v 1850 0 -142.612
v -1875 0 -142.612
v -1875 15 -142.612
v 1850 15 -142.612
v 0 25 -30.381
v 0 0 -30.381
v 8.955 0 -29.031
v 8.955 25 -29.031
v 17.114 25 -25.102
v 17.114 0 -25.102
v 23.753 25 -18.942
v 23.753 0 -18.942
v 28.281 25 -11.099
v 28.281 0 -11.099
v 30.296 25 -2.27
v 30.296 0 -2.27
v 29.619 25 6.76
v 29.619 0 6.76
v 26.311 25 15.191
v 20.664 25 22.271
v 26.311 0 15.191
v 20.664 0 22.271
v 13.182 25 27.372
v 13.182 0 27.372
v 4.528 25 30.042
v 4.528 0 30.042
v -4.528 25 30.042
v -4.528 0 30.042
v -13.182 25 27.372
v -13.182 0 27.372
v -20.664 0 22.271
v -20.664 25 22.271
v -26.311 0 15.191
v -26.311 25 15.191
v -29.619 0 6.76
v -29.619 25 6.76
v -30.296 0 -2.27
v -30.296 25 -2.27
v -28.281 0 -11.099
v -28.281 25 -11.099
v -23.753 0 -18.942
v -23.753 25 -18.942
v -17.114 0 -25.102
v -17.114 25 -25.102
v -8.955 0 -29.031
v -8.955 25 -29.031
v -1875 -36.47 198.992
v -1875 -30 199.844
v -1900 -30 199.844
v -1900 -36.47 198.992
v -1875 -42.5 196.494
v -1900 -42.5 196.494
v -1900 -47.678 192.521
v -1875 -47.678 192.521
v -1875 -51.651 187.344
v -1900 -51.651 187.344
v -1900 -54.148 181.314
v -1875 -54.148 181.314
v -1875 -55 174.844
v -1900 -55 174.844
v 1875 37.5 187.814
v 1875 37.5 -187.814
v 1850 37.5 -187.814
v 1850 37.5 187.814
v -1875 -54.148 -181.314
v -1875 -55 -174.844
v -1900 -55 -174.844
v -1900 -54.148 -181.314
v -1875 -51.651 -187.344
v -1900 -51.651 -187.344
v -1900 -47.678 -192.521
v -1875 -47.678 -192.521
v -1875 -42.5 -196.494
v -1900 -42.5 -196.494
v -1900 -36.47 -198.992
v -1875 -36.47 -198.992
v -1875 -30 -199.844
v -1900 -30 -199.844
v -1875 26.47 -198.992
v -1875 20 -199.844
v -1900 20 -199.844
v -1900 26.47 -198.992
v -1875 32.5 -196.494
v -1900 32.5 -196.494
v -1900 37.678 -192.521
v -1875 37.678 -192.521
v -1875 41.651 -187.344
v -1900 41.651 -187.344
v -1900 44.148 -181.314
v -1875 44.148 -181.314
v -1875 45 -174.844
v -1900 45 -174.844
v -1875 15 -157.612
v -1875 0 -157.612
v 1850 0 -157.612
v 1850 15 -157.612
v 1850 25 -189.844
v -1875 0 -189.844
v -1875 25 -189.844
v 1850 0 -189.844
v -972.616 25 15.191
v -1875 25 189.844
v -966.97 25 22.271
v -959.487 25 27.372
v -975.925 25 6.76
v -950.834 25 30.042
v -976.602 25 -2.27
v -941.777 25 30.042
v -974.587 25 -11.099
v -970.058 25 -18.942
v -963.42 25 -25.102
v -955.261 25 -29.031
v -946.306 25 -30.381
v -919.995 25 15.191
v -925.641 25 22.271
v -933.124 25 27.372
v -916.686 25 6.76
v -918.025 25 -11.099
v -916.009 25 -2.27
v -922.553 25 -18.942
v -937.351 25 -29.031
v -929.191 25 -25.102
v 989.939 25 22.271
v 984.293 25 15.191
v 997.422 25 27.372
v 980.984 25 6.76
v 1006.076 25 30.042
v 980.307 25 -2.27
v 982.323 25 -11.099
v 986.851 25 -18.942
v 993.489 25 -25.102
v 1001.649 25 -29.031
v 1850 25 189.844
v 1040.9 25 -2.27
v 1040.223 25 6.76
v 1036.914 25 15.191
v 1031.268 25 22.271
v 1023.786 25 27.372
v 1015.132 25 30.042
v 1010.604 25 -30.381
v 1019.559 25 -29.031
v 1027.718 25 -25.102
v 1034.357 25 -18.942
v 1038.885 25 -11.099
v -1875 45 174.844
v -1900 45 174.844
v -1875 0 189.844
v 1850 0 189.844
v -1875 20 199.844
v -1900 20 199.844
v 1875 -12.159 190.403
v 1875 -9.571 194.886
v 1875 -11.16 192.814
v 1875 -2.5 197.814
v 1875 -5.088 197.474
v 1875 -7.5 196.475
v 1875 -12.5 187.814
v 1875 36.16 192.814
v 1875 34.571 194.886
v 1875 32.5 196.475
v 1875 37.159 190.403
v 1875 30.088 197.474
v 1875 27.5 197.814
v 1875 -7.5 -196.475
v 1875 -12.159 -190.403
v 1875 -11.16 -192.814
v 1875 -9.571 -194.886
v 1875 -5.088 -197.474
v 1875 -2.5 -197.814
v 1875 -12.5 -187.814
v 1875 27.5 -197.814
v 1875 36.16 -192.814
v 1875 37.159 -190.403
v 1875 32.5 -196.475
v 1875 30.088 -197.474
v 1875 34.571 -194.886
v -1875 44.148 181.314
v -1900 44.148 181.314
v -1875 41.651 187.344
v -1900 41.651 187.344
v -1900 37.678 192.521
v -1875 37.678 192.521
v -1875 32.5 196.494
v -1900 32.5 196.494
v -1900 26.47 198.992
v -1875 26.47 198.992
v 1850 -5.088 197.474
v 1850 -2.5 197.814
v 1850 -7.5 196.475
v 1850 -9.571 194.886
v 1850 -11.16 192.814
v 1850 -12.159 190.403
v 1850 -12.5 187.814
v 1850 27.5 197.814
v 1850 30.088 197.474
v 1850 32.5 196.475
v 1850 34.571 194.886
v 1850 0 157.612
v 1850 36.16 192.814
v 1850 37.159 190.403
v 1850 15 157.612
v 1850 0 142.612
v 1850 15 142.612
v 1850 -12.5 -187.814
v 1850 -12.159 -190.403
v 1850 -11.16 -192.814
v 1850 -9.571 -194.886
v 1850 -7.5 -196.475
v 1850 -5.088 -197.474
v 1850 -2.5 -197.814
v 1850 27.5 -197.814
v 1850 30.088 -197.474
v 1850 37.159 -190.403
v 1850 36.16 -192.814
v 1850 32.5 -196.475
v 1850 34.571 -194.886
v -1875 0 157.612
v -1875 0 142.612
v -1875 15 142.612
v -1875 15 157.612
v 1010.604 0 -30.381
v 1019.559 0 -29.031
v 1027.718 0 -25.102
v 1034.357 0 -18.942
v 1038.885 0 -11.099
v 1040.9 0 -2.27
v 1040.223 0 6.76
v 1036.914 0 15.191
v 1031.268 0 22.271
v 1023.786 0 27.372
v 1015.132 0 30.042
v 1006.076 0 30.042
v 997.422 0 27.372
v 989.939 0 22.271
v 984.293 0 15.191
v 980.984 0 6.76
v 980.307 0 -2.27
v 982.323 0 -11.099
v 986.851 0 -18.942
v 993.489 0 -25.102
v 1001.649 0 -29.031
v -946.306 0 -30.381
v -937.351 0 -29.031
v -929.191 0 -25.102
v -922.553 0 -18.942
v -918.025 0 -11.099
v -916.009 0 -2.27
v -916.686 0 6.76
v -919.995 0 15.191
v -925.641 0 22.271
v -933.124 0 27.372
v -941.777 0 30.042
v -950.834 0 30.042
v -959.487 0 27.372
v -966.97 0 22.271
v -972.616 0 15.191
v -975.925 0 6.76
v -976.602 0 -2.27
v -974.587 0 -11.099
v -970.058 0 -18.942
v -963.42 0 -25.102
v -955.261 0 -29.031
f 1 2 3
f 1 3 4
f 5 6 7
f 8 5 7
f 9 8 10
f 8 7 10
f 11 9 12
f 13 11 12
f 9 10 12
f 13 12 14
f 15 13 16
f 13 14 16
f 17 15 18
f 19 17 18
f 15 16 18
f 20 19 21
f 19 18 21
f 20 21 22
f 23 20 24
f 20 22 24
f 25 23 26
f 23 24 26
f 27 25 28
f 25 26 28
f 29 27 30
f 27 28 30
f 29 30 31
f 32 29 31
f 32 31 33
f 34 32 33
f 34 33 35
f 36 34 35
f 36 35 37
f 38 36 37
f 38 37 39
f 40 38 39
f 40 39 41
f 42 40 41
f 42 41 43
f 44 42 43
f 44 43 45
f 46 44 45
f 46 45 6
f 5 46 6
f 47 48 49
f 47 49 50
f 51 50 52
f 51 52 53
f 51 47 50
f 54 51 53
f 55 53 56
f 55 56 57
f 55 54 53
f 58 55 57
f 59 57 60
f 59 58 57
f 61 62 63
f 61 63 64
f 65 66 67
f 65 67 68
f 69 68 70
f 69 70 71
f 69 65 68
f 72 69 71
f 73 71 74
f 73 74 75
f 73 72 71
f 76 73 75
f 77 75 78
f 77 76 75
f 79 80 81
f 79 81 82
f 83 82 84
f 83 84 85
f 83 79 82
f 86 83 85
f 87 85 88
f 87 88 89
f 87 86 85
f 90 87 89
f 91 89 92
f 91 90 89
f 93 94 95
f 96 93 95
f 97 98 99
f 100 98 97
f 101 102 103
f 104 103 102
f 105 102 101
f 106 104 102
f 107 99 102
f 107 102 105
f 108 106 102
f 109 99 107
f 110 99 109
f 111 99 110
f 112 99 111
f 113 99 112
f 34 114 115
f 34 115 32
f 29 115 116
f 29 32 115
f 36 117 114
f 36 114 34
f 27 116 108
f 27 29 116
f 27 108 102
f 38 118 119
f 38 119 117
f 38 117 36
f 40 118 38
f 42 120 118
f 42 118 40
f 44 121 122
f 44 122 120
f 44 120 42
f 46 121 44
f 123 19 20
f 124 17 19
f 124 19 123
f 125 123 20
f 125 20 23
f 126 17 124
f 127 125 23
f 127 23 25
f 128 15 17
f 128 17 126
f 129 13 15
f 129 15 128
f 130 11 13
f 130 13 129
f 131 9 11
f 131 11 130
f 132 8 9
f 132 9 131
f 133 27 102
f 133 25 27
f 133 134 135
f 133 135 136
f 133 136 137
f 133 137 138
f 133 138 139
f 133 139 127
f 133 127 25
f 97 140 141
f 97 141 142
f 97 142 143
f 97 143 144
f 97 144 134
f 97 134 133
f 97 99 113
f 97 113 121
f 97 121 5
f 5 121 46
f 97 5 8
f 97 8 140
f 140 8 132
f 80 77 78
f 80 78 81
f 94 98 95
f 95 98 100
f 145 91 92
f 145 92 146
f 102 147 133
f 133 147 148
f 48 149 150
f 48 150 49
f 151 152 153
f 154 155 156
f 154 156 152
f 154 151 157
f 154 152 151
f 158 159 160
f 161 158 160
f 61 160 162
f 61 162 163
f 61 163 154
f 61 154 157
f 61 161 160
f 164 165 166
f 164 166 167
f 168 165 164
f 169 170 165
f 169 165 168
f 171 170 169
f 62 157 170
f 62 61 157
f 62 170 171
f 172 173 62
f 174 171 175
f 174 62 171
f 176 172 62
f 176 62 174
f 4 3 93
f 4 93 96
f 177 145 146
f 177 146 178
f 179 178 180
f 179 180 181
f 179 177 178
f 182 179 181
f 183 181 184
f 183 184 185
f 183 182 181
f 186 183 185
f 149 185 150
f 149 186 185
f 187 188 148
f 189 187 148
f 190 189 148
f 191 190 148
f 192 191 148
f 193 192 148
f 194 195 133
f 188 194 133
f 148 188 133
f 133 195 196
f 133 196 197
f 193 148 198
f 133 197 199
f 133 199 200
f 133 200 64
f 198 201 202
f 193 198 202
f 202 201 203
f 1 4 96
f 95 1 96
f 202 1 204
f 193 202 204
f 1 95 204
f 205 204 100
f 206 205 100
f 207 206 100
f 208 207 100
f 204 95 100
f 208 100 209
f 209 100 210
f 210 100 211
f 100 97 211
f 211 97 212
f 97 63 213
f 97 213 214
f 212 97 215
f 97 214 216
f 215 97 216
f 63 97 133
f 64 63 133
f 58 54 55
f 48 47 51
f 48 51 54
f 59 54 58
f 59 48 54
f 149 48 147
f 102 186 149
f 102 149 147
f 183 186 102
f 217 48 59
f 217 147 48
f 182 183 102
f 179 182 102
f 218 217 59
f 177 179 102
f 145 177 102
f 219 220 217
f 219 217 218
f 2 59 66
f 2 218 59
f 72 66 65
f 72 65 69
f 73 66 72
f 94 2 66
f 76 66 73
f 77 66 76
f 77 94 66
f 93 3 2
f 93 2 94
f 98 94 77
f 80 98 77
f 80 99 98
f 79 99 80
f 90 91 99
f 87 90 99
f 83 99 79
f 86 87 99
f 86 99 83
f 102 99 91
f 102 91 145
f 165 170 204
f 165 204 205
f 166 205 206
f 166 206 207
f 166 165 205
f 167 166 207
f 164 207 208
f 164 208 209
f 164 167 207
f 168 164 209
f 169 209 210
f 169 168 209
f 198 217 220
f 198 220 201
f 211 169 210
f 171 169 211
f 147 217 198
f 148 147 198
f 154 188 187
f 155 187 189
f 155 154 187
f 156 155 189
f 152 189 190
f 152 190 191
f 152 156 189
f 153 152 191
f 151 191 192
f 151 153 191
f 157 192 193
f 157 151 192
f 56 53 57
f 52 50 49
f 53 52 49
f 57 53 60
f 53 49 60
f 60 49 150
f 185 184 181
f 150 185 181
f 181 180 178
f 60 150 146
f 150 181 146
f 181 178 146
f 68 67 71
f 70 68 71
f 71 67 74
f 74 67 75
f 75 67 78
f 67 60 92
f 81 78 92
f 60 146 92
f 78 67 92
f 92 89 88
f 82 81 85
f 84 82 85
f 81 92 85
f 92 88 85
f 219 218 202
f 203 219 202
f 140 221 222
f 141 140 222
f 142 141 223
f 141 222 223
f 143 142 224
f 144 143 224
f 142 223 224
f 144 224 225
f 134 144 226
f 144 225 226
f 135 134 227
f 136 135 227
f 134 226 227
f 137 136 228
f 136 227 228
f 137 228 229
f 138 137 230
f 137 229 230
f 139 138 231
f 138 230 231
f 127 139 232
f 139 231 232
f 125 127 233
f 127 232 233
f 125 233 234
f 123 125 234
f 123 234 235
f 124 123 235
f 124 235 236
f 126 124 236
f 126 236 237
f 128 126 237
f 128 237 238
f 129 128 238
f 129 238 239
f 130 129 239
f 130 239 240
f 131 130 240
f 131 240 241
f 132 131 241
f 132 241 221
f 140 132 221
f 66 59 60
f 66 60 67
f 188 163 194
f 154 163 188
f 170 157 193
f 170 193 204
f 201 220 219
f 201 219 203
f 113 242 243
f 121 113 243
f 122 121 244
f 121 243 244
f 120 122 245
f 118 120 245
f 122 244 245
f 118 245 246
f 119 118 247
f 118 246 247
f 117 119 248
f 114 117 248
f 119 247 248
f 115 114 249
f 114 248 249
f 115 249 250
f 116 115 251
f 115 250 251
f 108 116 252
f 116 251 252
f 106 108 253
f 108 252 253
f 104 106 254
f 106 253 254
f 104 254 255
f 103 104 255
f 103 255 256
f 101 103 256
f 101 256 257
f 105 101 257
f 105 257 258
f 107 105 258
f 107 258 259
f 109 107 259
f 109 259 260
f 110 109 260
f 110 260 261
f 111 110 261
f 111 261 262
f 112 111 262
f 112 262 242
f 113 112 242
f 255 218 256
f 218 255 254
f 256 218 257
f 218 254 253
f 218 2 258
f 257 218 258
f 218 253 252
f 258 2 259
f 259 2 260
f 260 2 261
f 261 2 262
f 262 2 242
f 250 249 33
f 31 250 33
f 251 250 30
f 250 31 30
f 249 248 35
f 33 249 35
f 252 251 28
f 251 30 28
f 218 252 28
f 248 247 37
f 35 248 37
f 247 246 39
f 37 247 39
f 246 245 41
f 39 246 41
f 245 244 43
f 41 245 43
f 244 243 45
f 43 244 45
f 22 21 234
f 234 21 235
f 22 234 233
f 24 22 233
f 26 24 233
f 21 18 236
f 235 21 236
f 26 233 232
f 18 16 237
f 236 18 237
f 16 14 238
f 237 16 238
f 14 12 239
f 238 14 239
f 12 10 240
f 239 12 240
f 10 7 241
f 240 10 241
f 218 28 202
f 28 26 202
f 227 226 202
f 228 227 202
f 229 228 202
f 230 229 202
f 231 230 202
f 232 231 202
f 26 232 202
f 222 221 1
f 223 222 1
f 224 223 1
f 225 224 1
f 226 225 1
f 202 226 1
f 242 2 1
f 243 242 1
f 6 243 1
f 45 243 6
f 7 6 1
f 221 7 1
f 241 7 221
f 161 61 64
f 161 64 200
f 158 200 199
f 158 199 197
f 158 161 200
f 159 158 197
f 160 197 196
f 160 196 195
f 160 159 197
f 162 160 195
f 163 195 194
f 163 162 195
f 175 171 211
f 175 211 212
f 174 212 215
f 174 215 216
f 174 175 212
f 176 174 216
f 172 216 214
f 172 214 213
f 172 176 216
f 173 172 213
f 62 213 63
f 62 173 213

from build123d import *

# Parameters (mm, degrees)
SKETCH1_W           = 3750
SKETCH1_H           = 379.6875
BOSS_EXTRUDE1_DEPTH = 25
SKETCH2_W           = 3806.146238169
SKETCH2_H           = 15
CUT_EXTRUDE1_DEPTH  = 15
SKETCH3_R           = 30.381139082
CUT_EXTRUDE2_DEPTH  = 1885.752145353
BOSS_EXTRUDE2_DEPTH = 25
BOSS_EXTRUDE3_DEPTH = 25


with BuildPart() as part:
    # Sketch1 → Boss-Extrude1 (new body)
    with BuildSketch(Plane(origin=(0, 0, 0), x_dir=(1, 0, 0), z_dir=(0, 1, 0))):
        Rectangle(SKETCH1_W, SKETCH1_H)
    extrude(amount=BOSS_EXTRUDE1_DEPTH)

    # Sketch2 → Cut-Extrude1 (cut)
    with BuildSketch(Plane.XZ):
        with Locations((28.073119084, 150.111800851)):
            Rectangle(SKETCH2_W, SKETCH2_H)
        with Locations((28.073119084, -150.111800851)):
            Rectangle(SKETCH2_W, SKETCH2_H)
    extrude(amount=-CUT_EXTRUDE1_DEPTH, mode=Mode.SUBTRACT)

    # Sketch3 → Cut-Extrude2 (cut, through all)
    with BuildSketch(Plane.XZ):
        with Locations(Location((0, 0, 0), (0, 0, 270))):
            Circle(SKETCH3_R)
        with Locations(Location((-946.305515807, 0, 0), (0, 0, 270))):
            Circle(SKETCH3_R)
        with Locations(Location((1010.603651897, 0, 0), (0, 0, 270))):
            Circle(SKETCH3_R)
    extrude(amount=-CUT_EXTRUDE2_DEPTH, mode=Mode.SUBTRACT)

    # Sketch4 → Boss-Extrude2 (add)
    with BuildSketch(Plane(origin=(1875, 0, 0), x_dir=(0, 0, -1), z_dir=(1, 0, 0))):
        with BuildLine():
            Line((-187.814440115, -12.5), (187.814440115, -12.5))
            ThreePointArc((187.814440115, -12.5), (194.885507927, -9.571067812), (197.814440115, -2.5))
            Line((197.814440115, -2.5), (197.814440115, 27.5))
            ThreePointArc((197.814440115, 27.5), (194.885507927, 34.571067812), (187.814440115, 37.5))
            Line((187.814440115, 37.5), (-187.814440115, 37.5))
            ThreePointArc((-187.814440115, 37.5), (-194.885507927, 34.571067812), (-197.814440115, 27.5))
            Line((-197.814440115, 27.5), (-197.814440115, -2.5))
            ThreePointArc((-197.814440115, -2.5), (-194.885507927, -9.571067812), (-187.814440115, -12.5))
        make_face()
    extrude(amount=-BOSS_EXTRUDE2_DEPTH)

    # Sketch5 → Boss-Extrude3 (add)
    with BuildSketch(Plane.ZY.offset(1875)):
        with BuildLine():
            Line((-174.84375, 45), (174.84375, 45))
            ThreePointArc((174.84375, 45), (192.52141953, 37.67766953), (199.84375, 20))
            Line((199.84375, 20), (199.84375, -30))
            ThreePointArc((199.84375, -30), (192.52141953, -47.67766953), (174.84375, -55))
            Line((174.84375, -55), (-174.84375, -55))
            ThreePointArc((-174.84375, -55), (-192.52141953, -47.67766953), (-199.84375, -30))
            Line((-199.84375, -30), (-199.84375, 20))
            ThreePointArc((-199.84375, 20), (-192.52141953, 37.67766953), (-174.84375, 45))
        make_face()
    extrude(amount=BOSS_EXTRUDE3_DEPTH)


solid = part.part
